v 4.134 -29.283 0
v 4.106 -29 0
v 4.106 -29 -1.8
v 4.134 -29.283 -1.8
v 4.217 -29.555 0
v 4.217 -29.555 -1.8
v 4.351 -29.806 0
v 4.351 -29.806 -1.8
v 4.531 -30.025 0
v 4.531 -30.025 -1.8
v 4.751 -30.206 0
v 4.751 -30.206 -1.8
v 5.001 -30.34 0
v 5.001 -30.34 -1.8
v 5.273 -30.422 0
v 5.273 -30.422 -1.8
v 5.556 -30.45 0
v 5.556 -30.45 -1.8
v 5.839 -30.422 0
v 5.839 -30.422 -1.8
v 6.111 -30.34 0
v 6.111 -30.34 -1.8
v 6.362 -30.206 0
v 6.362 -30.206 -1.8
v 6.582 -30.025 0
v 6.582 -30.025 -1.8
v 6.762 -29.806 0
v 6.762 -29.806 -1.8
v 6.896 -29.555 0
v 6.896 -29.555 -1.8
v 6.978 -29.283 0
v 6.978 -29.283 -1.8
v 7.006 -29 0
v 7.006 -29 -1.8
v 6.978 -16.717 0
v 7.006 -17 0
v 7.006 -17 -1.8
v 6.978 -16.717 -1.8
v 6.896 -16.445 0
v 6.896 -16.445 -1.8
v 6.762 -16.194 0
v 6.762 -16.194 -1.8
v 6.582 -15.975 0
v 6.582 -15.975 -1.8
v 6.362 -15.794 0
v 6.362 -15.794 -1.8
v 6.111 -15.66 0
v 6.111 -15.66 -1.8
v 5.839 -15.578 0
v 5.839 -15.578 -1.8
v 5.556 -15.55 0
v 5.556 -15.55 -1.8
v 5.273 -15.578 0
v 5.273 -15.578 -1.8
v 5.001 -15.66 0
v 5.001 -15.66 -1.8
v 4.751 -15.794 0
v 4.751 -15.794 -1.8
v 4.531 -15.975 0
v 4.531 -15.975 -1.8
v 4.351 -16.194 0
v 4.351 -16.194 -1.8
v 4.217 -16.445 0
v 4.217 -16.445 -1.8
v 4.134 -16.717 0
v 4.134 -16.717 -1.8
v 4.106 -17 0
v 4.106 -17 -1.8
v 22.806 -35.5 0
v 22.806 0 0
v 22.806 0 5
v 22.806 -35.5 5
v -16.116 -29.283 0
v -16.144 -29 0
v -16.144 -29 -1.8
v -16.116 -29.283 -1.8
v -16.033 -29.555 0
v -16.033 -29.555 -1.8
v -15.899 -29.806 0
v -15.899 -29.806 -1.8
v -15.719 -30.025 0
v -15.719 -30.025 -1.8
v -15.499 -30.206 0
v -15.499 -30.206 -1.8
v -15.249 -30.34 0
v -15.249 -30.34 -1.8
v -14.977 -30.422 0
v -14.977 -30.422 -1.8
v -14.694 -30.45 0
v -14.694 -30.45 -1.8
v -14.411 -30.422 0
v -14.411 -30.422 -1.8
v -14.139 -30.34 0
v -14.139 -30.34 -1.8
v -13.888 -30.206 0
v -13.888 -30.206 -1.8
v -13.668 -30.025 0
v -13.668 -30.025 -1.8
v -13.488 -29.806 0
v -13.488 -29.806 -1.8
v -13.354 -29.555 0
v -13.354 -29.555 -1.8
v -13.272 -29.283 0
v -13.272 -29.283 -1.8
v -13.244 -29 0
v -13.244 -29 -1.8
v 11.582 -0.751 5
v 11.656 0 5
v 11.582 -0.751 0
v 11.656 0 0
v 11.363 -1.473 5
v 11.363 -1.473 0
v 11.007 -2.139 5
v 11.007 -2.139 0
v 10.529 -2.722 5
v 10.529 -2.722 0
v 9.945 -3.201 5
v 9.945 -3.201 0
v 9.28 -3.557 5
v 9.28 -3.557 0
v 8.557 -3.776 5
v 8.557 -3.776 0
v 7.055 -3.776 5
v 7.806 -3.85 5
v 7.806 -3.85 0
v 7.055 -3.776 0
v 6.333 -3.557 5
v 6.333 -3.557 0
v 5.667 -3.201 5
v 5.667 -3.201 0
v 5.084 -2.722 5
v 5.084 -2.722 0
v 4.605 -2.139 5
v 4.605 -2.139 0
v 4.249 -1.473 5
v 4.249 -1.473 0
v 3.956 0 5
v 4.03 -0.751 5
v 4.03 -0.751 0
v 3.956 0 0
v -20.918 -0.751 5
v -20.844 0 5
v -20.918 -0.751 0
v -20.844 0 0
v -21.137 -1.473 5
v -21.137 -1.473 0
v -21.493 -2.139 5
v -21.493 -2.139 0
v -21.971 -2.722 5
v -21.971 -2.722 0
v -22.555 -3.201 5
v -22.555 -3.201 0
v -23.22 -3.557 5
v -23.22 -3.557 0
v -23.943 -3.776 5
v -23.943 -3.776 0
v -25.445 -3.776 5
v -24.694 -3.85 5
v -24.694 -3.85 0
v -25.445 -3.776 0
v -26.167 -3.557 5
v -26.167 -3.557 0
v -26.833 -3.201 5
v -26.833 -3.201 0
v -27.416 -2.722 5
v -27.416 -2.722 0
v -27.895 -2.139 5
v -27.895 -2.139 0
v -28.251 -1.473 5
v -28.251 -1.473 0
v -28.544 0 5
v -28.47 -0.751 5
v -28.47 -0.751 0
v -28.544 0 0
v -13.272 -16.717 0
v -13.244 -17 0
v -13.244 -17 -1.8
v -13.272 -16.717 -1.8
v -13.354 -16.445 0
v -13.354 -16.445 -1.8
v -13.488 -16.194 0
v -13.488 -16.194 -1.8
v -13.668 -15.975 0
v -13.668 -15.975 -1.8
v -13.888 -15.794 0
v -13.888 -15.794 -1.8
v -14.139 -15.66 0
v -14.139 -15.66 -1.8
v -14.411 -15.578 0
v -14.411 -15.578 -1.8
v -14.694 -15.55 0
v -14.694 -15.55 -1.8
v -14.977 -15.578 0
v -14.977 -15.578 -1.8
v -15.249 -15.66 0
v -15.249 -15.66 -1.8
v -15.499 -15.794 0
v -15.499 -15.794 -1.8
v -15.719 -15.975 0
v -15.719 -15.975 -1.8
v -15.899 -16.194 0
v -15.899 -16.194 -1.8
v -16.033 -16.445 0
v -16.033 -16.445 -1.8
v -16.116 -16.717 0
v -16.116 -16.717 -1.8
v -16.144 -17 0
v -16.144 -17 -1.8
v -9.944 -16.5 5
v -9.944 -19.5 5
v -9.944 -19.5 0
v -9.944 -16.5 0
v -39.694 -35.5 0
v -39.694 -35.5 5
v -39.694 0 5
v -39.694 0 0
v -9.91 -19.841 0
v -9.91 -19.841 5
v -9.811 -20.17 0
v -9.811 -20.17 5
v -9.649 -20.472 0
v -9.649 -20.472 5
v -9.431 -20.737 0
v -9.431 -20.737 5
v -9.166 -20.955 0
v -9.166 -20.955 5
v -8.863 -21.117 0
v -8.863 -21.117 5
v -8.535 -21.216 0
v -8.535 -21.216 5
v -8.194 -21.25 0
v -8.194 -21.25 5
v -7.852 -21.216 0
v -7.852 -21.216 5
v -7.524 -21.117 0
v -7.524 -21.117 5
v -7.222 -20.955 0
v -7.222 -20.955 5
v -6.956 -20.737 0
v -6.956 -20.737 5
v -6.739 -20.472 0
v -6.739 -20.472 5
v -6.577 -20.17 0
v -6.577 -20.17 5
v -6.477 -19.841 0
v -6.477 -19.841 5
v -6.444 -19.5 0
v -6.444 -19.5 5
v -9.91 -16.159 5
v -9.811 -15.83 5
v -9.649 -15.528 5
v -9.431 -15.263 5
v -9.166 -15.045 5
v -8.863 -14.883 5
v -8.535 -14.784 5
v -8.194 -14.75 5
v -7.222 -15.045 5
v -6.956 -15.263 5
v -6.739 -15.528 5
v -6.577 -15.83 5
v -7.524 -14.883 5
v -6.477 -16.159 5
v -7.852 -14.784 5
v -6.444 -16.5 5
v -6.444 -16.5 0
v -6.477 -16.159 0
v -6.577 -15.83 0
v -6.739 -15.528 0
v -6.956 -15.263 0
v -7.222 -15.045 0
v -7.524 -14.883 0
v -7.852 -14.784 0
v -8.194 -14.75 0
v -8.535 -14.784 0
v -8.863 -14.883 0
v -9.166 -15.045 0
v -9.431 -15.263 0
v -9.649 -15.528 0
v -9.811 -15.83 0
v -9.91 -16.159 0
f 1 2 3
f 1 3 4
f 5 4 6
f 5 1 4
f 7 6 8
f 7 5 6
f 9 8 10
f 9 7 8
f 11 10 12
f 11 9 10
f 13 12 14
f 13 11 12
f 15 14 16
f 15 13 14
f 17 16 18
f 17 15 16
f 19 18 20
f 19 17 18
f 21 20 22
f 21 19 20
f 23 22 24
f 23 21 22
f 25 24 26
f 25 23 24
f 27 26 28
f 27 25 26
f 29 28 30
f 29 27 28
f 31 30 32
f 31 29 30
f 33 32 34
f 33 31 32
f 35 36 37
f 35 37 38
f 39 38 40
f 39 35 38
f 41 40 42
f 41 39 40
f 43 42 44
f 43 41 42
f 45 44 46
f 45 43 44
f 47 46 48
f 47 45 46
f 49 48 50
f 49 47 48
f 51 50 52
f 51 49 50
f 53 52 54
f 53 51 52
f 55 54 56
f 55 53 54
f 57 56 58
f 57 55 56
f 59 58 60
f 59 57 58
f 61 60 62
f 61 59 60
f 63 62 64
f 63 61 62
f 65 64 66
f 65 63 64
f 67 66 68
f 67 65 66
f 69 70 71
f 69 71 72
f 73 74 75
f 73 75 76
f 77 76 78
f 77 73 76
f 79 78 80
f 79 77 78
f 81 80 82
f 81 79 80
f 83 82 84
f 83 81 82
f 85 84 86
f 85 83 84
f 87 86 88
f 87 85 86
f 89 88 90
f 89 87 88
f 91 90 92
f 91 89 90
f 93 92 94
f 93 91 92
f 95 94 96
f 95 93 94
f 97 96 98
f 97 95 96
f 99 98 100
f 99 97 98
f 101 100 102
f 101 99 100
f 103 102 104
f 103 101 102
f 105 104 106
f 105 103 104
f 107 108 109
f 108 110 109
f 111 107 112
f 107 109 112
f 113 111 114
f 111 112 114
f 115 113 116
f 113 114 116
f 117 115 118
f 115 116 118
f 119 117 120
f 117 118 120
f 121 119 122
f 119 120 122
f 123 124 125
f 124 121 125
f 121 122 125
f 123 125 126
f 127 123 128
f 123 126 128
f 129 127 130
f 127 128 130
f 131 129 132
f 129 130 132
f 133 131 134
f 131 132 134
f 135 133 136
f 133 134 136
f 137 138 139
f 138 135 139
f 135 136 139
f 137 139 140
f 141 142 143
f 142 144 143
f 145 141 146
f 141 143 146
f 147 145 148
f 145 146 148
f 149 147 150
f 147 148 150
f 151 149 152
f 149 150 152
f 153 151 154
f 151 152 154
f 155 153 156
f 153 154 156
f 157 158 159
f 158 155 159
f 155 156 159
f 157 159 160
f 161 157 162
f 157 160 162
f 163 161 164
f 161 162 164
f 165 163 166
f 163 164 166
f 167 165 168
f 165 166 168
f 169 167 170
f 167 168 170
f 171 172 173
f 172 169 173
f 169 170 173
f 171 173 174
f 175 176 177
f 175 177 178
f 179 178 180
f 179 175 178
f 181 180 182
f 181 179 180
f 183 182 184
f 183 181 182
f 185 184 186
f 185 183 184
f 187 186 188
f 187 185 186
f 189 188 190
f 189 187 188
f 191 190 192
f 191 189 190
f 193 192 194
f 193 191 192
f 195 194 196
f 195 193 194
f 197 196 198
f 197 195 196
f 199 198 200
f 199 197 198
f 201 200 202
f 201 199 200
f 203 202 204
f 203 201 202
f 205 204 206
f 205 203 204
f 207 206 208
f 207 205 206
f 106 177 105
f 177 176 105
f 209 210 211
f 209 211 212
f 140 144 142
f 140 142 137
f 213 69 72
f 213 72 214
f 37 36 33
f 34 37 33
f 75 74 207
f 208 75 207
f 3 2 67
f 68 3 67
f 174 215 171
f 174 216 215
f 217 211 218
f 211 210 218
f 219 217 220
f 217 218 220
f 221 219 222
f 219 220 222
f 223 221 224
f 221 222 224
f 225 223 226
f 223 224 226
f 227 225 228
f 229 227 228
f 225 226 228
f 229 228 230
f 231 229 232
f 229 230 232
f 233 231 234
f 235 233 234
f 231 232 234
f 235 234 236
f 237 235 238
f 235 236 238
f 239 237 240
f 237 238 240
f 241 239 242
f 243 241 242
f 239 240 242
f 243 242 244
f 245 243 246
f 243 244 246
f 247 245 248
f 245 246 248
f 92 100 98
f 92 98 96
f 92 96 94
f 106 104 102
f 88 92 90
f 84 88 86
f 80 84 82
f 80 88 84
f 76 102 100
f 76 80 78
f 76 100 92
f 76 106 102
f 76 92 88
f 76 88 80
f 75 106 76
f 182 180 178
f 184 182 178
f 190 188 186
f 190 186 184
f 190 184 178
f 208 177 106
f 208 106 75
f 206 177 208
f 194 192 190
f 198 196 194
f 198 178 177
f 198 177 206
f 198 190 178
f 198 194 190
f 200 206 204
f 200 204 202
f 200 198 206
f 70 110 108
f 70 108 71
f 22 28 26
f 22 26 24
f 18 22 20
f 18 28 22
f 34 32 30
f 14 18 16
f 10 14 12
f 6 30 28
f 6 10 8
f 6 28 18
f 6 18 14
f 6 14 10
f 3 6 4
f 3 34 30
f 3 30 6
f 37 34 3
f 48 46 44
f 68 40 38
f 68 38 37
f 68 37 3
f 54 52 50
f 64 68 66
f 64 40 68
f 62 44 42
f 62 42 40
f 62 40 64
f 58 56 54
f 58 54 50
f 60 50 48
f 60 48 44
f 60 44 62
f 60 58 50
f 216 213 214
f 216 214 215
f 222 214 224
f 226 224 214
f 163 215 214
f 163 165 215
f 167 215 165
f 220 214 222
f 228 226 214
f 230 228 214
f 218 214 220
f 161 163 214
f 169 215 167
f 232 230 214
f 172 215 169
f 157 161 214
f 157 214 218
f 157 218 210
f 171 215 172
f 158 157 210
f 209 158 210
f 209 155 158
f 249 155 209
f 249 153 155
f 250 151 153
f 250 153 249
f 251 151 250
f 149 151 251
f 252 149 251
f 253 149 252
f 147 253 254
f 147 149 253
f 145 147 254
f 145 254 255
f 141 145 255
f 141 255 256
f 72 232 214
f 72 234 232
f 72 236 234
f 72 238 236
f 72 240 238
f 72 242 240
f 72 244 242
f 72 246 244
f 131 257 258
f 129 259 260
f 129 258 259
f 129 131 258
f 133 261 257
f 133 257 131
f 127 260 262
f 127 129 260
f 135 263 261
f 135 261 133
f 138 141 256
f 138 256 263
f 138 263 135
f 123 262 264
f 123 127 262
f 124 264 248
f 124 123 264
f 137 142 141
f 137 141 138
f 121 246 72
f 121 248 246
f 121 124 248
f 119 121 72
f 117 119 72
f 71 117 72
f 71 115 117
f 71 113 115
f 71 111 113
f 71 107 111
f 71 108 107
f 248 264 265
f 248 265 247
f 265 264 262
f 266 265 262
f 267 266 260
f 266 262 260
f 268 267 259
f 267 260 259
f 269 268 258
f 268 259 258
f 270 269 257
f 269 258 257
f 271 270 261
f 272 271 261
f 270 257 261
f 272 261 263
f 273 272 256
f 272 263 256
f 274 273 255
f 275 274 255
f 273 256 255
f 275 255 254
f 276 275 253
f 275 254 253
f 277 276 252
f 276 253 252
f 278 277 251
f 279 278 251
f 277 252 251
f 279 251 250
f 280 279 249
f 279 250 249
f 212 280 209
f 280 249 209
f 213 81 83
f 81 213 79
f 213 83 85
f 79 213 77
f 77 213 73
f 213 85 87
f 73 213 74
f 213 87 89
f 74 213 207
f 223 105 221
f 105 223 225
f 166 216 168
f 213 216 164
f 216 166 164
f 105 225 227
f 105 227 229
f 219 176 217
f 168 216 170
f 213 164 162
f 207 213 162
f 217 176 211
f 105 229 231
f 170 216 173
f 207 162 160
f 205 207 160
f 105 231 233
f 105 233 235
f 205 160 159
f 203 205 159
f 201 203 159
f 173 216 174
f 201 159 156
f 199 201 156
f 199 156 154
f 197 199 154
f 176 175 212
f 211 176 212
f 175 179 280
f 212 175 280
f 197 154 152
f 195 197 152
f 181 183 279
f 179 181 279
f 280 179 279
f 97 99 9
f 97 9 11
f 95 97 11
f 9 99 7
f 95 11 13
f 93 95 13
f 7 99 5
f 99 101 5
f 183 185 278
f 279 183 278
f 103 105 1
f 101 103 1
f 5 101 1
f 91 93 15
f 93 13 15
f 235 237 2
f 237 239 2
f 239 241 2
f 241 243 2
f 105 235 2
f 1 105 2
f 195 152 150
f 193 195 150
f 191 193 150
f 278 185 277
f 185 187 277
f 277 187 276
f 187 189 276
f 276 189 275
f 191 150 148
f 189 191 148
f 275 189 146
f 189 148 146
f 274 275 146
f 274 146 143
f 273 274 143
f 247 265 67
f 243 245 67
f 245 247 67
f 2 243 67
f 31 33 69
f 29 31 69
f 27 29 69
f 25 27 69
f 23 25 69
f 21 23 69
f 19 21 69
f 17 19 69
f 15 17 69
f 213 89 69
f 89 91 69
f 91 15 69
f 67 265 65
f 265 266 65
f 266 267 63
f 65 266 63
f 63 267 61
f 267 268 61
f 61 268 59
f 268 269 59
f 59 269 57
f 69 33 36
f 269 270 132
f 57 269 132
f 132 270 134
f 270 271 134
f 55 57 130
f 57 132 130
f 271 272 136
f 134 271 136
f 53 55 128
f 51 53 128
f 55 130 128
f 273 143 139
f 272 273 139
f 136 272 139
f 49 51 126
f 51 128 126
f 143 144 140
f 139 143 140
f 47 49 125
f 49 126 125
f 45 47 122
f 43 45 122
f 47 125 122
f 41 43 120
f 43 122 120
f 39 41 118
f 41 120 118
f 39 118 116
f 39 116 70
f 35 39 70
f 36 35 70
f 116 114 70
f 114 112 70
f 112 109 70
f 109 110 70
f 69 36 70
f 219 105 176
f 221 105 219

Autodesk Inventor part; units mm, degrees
ref_plane "YZ Plane" through (0, 0, 0) normal (1, 0, 0) x (0, 1, 0)
ref_plane "XZ Plane" through (0, 0, 0) normal (0, 1, 0) x (-1, 0, 0)
ref_plane "XY Plane" through (0, 0, 0) normal (0, 0, 1) x (1, 0, 0)
ref_plane "Work Plane1" through (0, 0, 0) normal (0, 0, 1) x (1, 0, 0)
sketch "Sketch1" plane through (0, 0, 0) normal (0, 0, 1) x (1, 0, 0)
  circle A0 centre (11.5562, -18) radius 2 construction
  line L0 (-53.1938, -16) -> (-53.1938, -30) construction
  arc A1 (-56.1938, -30) -> (-53.1938, -30) centre (-54.6938, -30) ccw construction
  line L1 (-56.1938, -30) -> (-56.1938, -16) construction
  arc A2 (-53.1938, -16) -> (-56.1938, -16) centre (-54.6938, -16) ccw construction
  line L2 (7.0562, -16) -> (7.0562, -30) construction
  arc A3 (4.0562, -30) -> (7.0562, -30) centre (5.5562, -30) ccw construction
  line L3 (4.0562, -30) -> (4.0562, -16) construction
  arc A4 (7.0562, -16) -> (4.0562, -16) centre (5.5562, -16) ccw construction
  line L4 (-13.1938, -16) -> (-13.1938, -30) construction
  arc A5 (-16.1938, -30) -> (-13.1938, -30) centre (-14.6938, -30) ccw construction
  line L5 (-16.1938, -30) -> (-16.1938, -16) construction
  arc A6 (-13.1938, -16) -> (-16.1938, -16) centre (-14.6938, -16) ccw construction
  arc A7 (19.0562, -16) -> (16.0562, -16) centre (17.5562, -16) ccw construction
  line L6 (19.0562, -16) -> (19.0562, -30) construction
  arc A8 (16.0562, -30) -> (19.0562, -30) centre (17.5562, -30) ccw construction
  line L7 (16.0562, -30) -> (16.0562, -16) construction
  line L8 (22.8064, -40) -> (22.8064, 45) construction
  line L9 (22.8064, 45) -> (-120, 45) construction
  line L10 (-120, 27.5563) -> (-120, 45) construction
  line L11 (-120, 27.5563) -> (-95.2035, 27.5563) construction
  arc A9 (-85.0841, 27.5563) -> (-95.2035, 27.5563) centre (-90.1438, 25.4) ccw construction
  line L12 (-85.0841, 27.5563) -> (17.8062, 27.5563) construction
  line L13 (17.8062, 27.5563) -> (17.8062, -11) construction
  line L14 (17.8062, -11) -> (-120, -11) construction
  line L15 (-120, -40) -> (-120, -11) construction
  line L16 (22.8064, -40) -> (-120, -40) construction
  circle A10 centre (-111.1938, -18) radius 2 construction
  circle A11 centre (-98.1938, -18) radius 2 construction
  circle A12 centre (-61.1938, -18) radius 2 construction
  circle A13 centre (-48.1938, -18) radius 2 construction
  circle A14 centre (-21.1938, -18) radius 2 construction
  circle A15 centre (-8.1938, -18) radius 2 construction
  circle A16 centre (-21.1938, 33.6563) radius 2 construction
  circle A17 centre (-8.1938, 33.6563) radius 2 construction
  circle A18 centre (-61.1938, 33.6563) radius 2 construction
  circle A19 centre (-48.1938, 33.6563) radius 2 construction
  circle A20 centre (-111.1938, 33.6563) radius 2 construction
  circle A21 centre (-98.1938, 33.6563) radius 2 construction
  circle A22 centre (-90.1438, -25.4) radius 5.5 construction
  circle A23 centre (7.8062, 0) radius 3.75 construction
  circle A24 centre (-24.6938, 0) radius 3.75 construction
  line L17 (22.8064, -35.5) -> (-39.6938, -35.5)
  line L18 (-39.6938, -35.5) -> (-39.6938, 0)
  line L19 (-39.6938, 0) -> (-28.5438, 0)
  line L20 (22.8064, 0) -> (22.8064, -35.5)
  line L21 (-34.6938, -11) -> (-34.6938, 11) construction
  arc A25 (3.9562, 0) -> (11.6562, 0) centre (7.8062, 0) ccw
  line L22 (11.6562, 0) -> (22.8064, 0)
  arc A26 (-28.5438, 0) -> (-20.8438, 0) centre (-24.6938, 0) ccw
  line L23 (-20.8438, 0) -> (3.9562, 0)
  point P0 (0, 0)
  point P1 (17.5562, -31.5)
  dimension "d0" = 5
  dimension "d1" = 0
  dimension "d2" = 0.1
  dimension "d3" = 0.1
  dimension "d4" = 4
extrude "Main Body" add sketch "Sketch1" along normal blind 5
sketch "Sketch2" plane through (0, 0, 0) normal (0, 0, -1) x (-1, 0, 0)
  line L0 (16.1938, -30) -> (16.1938, -16) construction
  arc A0 (13.1938, -30) -> (16.1938, -30) centre (14.6938, -30) ccw construction
  line L1 (13.1938, -16) -> (13.1938, -30) construction
  arc A1 (16.1938, -16) -> (13.1938, -16) centre (14.6938, -16) ccw construction
  line L2 (16.1938, -30) -> (16.1938, -16) construction
  line L3 (-4.0562, -30) -> (-4.0562, -16) construction
  arc A2 (-7.0562, -30) -> (-4.0562, -30) centre (-5.5562, -30) ccw construction
  line L4 (-7.0562, -16) -> (-7.0562, -30) construction
  arc A3 (-4.0562, -16) -> (-7.0562, -16) centre (-5.5562, -16) ccw construction
  line L5 (-5.5562, -16) -> (-5.5562, -30) construction
  line L6 (14.6938, -16) -> (14.6938, -30) construction
  line L7 (-5.5562, -17) -> (-5.5562, -29) construction
  line L8 (-7.0062, -17) -> (-7.0062, -29)
  line L9 (-4.1062, -29) -> (-4.1062, -17)
  arc A4 (-4.1062, -17) -> (-7.0062, -17) centre (-5.5562, -17) ccw
  arc A5 (-7.0062, -29) -> (-4.1062, -29) centre (-5.5562, -29) ccw
  line L10 (14.6938, -17) -> (14.6938, -29) construction
  line L11 (13.2438, -17) -> (13.2438, -29)
  line L12 (16.1438, -29) -> (16.1438, -17)
  arc A6 (16.1438, -17) -> (13.2438, -17) centre (14.6938, -17) ccw
  arc A7 (13.2438, -29) -> (16.1438, -29) centre (14.6938, -29) ccw
  line L13 (-5.5562, -17) -> (14.6938, -17) construction
  line L14 (-5.5562, -29) -> (14.6938, -29) construction
  point P0 (0, 0)
  point P1 (-5.5562, -23)
  point P2 (14.6938, -23)
  dimension "d9" = 0.05
  dimension "d10" = 0.05
  dimension "d11" = 1
  dimension "d12" = 1
extrude "Alignment Tabs" add sketch "Sketch2" along normal blind 1.8
sketch "Sketch3" plane through (0, 0, 5) normal (0, 0, 1) x (1, 0, 0)
  circle A0 centre (-8.1938, -18) radius 2 construction
  line L0 (-8.1938, -31.3066) -> (-8.1938, -7.4741) construction
  line L1 (-8.1938, -16.5) -> (-8.1938, -19.5) construction
  line L2 (-6.4438, -16.5) -> (-6.4438, -19.5)
  line L3 (-9.9438, -19.5) -> (-9.9438, -16.5)
  arc A1 (-6.4438, -16.5) -> (-9.9438, -16.5) centre (-8.1938, -16.5) ccw
  arc A2 (-9.9438, -19.5) -> (-6.4438, -19.5) centre (-8.1938, -19.5) ccw
  point P0 (0, 0)
  dimension "d14" = 3.5
  dimension "d15" = 3
extrude "Slot for Screw M3" cut sketch "Sketch3" against normal through all
equation "\"d3\" = d2"
equation "\"d10\" = d9"
equation "\"d12\" = d11"
properties part number "Cuvette Aligner 50mm"
